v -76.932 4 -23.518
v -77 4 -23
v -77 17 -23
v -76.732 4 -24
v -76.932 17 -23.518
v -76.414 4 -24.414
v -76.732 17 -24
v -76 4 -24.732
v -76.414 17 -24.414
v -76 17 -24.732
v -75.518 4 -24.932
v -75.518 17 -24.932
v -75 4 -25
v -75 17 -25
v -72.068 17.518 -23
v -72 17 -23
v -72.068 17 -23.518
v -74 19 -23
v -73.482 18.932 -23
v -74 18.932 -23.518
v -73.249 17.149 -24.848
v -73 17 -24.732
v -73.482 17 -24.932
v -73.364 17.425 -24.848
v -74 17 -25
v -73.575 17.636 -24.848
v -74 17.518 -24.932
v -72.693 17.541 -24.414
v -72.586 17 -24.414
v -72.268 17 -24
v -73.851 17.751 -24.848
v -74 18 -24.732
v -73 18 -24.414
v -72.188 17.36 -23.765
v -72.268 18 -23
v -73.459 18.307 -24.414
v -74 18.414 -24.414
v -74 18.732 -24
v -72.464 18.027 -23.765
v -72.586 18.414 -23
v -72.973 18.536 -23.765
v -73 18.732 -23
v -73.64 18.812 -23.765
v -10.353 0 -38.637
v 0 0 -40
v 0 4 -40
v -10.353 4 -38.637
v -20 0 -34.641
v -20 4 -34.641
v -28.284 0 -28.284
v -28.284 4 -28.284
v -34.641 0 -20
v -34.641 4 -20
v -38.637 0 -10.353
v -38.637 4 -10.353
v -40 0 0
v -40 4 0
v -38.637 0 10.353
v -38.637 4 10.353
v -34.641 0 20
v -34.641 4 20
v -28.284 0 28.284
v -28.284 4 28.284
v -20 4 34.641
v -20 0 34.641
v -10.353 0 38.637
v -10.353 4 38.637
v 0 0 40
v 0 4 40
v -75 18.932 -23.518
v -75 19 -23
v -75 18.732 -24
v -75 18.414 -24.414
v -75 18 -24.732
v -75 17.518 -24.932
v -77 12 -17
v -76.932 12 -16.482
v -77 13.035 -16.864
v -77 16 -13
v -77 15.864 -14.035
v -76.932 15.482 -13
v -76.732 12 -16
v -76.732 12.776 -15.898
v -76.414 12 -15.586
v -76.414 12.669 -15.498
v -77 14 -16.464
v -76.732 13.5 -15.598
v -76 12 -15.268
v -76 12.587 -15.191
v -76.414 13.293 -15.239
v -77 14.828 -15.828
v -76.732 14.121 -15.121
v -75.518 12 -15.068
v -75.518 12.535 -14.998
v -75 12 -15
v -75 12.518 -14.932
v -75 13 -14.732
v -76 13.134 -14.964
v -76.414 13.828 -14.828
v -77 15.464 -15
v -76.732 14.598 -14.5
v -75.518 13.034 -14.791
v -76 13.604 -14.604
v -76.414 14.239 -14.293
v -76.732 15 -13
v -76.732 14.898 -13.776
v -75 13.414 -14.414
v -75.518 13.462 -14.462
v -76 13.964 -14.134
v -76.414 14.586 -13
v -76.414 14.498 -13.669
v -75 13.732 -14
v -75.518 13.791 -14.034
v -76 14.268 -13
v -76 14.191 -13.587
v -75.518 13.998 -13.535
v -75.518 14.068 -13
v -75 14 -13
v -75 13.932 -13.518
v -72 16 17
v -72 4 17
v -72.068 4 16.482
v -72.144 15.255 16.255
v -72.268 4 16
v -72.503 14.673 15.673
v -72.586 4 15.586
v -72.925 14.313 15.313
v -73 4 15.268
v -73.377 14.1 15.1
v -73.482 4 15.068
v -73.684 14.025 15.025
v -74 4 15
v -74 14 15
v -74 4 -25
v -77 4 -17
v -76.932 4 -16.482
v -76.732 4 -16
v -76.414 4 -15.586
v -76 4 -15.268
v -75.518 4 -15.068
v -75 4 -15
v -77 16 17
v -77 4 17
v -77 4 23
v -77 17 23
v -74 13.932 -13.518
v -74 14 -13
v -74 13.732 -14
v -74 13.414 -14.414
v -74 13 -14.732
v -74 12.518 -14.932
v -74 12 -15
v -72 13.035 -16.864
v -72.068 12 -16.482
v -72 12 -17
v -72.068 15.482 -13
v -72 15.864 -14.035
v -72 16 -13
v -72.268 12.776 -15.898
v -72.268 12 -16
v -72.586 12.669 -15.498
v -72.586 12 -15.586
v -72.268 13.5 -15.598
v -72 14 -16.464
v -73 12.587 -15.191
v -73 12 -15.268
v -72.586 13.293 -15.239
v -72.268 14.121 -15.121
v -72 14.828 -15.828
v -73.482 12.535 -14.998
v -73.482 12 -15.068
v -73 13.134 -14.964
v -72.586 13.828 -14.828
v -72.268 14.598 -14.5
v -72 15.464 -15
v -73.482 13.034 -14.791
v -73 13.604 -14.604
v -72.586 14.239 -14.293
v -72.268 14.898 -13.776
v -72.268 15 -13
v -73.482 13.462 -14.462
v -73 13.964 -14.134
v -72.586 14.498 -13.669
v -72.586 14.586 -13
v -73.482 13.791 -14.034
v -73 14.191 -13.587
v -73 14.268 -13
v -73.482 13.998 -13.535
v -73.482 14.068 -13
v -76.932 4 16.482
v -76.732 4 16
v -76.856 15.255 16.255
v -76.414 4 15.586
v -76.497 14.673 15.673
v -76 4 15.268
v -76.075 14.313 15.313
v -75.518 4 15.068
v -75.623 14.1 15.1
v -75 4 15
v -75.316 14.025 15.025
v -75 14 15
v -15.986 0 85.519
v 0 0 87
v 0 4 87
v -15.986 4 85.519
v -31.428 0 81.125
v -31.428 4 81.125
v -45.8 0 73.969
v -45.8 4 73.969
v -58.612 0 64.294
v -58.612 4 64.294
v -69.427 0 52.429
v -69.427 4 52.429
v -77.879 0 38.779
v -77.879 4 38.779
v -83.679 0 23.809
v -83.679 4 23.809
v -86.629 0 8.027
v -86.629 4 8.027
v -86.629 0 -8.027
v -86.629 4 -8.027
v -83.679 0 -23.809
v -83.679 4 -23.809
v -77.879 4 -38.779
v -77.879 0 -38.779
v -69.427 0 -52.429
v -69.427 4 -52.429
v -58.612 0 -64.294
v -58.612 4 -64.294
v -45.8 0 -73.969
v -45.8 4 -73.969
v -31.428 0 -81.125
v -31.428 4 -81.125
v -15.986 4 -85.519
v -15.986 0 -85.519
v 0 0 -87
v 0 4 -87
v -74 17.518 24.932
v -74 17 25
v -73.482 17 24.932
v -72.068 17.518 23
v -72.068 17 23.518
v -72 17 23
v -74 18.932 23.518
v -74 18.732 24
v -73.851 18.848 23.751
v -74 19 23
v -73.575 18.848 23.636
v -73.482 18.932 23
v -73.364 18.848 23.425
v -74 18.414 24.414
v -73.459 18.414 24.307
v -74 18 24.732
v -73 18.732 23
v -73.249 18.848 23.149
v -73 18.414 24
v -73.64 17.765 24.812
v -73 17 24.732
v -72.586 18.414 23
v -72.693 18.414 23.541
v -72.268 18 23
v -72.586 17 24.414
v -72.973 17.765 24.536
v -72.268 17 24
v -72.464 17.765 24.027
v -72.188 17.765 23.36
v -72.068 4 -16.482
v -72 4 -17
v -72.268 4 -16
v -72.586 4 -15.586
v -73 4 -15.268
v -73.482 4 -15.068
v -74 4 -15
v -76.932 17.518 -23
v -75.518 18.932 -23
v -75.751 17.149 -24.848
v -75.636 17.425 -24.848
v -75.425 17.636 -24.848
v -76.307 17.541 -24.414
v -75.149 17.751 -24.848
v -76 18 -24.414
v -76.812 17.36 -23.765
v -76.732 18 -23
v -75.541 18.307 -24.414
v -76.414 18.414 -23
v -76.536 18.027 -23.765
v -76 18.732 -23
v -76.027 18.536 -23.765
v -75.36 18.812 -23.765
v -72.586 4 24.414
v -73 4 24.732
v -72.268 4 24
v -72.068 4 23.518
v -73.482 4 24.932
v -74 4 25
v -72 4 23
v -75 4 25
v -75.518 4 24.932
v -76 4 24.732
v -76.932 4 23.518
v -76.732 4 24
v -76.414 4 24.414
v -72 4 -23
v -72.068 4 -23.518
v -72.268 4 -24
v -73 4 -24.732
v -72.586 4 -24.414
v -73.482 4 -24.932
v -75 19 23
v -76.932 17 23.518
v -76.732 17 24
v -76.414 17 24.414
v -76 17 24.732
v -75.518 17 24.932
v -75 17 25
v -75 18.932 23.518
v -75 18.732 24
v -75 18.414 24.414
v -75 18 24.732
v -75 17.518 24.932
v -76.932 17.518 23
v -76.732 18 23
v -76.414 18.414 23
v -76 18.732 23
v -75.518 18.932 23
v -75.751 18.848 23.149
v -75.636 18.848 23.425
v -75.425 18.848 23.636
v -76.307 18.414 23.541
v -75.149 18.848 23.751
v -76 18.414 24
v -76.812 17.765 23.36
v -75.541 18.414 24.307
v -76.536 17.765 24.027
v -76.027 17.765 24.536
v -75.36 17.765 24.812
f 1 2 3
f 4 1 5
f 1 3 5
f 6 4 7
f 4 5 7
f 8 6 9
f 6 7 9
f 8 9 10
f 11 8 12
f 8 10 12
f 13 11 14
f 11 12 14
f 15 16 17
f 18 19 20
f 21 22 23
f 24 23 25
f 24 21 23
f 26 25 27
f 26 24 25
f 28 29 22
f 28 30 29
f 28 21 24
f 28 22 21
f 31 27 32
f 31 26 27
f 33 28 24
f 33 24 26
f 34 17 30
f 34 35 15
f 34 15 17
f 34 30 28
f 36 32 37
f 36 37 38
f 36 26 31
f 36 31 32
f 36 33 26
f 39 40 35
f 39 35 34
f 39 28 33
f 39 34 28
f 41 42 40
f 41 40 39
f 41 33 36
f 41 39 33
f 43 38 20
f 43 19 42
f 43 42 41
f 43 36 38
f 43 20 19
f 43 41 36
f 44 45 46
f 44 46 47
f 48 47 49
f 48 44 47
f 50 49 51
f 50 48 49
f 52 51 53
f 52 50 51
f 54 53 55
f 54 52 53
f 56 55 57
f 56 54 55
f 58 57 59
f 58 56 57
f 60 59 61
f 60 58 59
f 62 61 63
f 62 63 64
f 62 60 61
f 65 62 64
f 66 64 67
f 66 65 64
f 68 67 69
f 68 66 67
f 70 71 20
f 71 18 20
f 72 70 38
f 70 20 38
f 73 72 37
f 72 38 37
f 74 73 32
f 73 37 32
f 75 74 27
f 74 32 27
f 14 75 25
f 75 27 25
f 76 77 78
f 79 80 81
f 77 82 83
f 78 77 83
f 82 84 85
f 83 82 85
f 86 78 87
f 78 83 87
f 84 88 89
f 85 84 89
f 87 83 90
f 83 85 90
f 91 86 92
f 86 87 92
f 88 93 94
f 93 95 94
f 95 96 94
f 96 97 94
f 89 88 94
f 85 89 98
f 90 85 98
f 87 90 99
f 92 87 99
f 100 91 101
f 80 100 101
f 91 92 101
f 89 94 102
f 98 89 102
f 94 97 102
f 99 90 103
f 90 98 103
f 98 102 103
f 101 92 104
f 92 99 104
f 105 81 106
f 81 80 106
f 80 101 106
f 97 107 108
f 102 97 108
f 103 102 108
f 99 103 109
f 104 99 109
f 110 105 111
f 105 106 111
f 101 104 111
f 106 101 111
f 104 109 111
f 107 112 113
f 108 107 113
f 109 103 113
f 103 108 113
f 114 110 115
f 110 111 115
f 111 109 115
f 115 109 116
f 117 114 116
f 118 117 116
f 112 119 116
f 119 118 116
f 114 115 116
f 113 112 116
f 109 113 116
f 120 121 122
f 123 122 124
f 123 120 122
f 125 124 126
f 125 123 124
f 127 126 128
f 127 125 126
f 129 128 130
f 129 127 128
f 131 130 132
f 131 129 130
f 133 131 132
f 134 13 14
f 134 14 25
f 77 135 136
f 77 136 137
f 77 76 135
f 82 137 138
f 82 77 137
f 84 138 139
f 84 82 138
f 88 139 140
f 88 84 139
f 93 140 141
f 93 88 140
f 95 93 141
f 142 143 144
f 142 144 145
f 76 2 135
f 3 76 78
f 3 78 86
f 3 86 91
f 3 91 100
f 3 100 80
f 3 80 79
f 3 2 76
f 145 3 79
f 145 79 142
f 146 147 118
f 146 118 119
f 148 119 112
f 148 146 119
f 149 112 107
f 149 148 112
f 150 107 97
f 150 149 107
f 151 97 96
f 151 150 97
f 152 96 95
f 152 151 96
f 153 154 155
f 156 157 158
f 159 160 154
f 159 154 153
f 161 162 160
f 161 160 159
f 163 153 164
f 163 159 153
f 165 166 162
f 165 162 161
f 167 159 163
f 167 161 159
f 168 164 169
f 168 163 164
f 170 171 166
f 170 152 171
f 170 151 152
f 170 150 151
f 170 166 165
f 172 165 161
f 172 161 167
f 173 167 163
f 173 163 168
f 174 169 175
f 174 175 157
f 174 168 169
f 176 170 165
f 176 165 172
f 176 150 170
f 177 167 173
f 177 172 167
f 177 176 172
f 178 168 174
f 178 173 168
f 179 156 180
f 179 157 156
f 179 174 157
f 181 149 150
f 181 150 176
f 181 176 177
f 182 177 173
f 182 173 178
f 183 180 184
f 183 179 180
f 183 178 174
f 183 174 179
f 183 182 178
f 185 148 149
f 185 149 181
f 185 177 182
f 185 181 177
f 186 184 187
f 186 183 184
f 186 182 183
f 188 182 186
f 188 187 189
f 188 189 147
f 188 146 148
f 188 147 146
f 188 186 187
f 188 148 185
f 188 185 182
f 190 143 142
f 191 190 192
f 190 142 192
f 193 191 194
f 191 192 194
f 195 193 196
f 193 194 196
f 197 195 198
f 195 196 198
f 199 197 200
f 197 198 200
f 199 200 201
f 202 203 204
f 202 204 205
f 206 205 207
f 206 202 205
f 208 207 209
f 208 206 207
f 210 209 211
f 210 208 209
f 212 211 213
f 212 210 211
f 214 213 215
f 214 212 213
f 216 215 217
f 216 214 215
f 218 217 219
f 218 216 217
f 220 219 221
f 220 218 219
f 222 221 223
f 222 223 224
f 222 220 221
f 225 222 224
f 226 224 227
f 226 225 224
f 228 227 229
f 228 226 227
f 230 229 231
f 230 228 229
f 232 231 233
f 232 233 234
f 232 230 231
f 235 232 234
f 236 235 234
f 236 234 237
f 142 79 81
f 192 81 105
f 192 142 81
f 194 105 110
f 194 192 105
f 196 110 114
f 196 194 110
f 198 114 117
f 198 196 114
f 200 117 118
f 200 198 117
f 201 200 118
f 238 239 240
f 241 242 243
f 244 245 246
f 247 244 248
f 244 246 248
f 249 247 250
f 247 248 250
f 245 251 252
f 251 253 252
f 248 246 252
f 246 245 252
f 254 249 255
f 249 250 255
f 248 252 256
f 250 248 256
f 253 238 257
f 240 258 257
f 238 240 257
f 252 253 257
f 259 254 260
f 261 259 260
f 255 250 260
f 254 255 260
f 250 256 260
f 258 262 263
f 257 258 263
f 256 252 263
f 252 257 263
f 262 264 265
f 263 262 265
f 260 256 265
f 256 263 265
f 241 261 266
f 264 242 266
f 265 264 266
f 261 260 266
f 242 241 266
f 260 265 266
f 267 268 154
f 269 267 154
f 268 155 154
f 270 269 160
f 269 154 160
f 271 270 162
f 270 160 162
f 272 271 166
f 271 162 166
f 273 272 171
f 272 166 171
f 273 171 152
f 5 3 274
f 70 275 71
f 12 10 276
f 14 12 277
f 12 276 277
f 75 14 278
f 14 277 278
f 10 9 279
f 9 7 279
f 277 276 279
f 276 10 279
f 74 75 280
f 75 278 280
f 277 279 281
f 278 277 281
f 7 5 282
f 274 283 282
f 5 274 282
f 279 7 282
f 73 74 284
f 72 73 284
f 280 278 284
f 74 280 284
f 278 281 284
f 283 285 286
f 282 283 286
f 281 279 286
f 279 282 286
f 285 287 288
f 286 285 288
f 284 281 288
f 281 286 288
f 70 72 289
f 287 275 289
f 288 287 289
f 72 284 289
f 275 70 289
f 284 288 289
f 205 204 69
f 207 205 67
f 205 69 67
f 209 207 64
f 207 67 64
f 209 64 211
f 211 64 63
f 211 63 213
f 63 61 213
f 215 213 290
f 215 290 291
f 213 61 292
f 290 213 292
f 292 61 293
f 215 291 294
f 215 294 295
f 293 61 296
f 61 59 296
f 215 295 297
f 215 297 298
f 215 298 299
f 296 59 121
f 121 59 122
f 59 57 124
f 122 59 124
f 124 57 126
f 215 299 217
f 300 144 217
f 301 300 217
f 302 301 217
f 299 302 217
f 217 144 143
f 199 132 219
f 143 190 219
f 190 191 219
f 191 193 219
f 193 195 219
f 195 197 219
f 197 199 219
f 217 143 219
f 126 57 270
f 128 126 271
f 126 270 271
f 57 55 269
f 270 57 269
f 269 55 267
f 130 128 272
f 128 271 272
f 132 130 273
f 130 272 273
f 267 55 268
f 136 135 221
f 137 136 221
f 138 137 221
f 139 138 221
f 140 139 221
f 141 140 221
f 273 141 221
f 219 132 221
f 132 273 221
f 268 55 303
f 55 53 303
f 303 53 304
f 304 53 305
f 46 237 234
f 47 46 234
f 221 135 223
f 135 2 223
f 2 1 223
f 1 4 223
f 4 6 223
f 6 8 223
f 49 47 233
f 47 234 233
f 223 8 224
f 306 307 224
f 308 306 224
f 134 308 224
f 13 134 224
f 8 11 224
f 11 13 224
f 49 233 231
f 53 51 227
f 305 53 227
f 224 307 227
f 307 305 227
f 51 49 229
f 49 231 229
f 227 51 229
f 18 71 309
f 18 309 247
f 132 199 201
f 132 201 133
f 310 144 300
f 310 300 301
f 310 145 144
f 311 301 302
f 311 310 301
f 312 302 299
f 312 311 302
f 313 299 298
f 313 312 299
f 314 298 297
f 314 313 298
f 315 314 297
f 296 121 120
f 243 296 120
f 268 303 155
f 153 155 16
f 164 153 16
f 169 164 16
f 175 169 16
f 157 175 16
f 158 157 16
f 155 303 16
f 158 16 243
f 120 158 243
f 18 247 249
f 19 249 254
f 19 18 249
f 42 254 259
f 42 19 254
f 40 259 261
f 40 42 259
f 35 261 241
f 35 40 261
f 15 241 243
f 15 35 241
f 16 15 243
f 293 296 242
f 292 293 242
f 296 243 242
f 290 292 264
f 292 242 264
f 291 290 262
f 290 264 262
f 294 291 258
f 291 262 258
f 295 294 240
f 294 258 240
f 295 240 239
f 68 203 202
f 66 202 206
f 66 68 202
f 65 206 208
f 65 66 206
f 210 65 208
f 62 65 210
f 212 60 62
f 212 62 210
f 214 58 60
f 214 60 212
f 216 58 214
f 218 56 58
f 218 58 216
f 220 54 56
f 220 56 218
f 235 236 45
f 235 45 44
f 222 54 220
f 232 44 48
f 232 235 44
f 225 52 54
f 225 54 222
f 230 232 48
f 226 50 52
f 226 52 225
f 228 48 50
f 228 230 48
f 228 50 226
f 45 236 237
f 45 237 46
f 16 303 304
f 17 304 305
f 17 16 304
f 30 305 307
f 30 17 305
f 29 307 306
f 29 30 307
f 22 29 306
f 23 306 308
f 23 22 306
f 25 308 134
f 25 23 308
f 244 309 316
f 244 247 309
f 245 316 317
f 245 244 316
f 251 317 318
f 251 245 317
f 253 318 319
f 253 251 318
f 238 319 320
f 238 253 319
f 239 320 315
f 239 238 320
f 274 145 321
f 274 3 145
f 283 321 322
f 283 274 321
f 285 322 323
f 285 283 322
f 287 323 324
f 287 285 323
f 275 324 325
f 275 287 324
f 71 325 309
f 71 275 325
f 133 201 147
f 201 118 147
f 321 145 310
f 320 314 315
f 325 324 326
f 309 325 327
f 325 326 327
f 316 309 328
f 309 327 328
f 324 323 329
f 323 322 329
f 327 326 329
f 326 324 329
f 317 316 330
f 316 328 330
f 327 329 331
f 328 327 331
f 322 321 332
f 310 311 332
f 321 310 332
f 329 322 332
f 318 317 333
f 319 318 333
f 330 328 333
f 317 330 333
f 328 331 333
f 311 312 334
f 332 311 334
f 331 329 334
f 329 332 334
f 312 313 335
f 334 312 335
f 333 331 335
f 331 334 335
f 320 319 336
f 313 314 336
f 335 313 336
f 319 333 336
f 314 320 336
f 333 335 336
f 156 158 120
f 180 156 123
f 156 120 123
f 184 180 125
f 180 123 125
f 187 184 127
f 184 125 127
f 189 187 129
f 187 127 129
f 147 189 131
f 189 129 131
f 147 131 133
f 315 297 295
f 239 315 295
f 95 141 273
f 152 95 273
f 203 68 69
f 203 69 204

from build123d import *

# Parameters (mm, degrees)
BOSS_EXTRUDE1_DEPTH = 4
SKETCH2_W           = 5
SKETCH2_H           = 10
BOSS_EXTRUDE2_DEPTH = 15
BOSS_EXTRUDE3_REACH = 137.403
SKETCH3_W           = 5
SKETCH3_H           = 5
FILLET1_R           = 2


with BuildPart() as part:
    # Sketch1 → Boss-Extrude1 (new body)
    with BuildSketch(Plane(origin=(0, 0, 0), x_dir=(1, 0, 0), z_dir=(0, 1, 0))):
        with BuildLine():
            Line((0, 87), (0, 40))
            ThreePointArc((0, 40), (-40, 0), (0, -40))
            Line((0, -40), (0, -87))
            ThreePointArc((0, -87), (-87, 0), (0, 87))
        make_face()
    extrude(amount=BOSS_EXTRUDE1_DEPTH)

    # Sketch2 → Boss-Extrude2 (add)
    with BuildSketch(Plane(origin=(0, 4, 0), x_dir=(1, 0, 0), z_dir=(0, 1, 0))):
        with Locations((-74.5, -20)):
            Rectangle(SKETCH2_W, SKETCH2_H)
        with Locations((-74.5, 20)):
            Rectangle(SKETCH2_W, SKETCH2_H)
    extrude(amount=BOSS_EXTRUDE2_DEPTH)

    # Sketch3 → Boss-Extrude3 (add, up to next)
    with BuildSketch(Plane.XY.offset(-15), mode=Mode.PRIVATE) as boss_extrude3_sk1:
        with Locations((-74.5, 16.5)):
            Rectangle(SKETCH3_W, SKETCH3_H)
    boss_extrude3_tool1 = extrude(boss_extrude3_sk1.sketch, amount=BOSS_EXTRUDE3_REACH, mode=Mode.PRIVATE) - part.part
    add(boss_extrude3_tool1.solids().sort_by_distance((-74.5, 16.5, -15))[0])

    # Fillet1
    fillet1_edges = [part.edges().sort_by_distance(p)[0] for p in [
        (-77, 11.5, 25),
        (-72, 11.5, 25),
        (-77, 19, 0),
        (-74.5, 19, 25),
        (-72, 19, 0),
        (-77, 11.5, -25),
        (-72, 11.5, -25),
        (-74.5, 19, -25),
        (-72, 9, -15),
        (-77, 9, -15),
        (-77, 9, 15),
        (-72, 9, 15),
        (-72, 14, 0),
        (-77, 14, 0),
        (-74.5, 14, -15),
    ]]
    fillet(fillet1_edges, radius=FILLET1_R)


solid = part.part
